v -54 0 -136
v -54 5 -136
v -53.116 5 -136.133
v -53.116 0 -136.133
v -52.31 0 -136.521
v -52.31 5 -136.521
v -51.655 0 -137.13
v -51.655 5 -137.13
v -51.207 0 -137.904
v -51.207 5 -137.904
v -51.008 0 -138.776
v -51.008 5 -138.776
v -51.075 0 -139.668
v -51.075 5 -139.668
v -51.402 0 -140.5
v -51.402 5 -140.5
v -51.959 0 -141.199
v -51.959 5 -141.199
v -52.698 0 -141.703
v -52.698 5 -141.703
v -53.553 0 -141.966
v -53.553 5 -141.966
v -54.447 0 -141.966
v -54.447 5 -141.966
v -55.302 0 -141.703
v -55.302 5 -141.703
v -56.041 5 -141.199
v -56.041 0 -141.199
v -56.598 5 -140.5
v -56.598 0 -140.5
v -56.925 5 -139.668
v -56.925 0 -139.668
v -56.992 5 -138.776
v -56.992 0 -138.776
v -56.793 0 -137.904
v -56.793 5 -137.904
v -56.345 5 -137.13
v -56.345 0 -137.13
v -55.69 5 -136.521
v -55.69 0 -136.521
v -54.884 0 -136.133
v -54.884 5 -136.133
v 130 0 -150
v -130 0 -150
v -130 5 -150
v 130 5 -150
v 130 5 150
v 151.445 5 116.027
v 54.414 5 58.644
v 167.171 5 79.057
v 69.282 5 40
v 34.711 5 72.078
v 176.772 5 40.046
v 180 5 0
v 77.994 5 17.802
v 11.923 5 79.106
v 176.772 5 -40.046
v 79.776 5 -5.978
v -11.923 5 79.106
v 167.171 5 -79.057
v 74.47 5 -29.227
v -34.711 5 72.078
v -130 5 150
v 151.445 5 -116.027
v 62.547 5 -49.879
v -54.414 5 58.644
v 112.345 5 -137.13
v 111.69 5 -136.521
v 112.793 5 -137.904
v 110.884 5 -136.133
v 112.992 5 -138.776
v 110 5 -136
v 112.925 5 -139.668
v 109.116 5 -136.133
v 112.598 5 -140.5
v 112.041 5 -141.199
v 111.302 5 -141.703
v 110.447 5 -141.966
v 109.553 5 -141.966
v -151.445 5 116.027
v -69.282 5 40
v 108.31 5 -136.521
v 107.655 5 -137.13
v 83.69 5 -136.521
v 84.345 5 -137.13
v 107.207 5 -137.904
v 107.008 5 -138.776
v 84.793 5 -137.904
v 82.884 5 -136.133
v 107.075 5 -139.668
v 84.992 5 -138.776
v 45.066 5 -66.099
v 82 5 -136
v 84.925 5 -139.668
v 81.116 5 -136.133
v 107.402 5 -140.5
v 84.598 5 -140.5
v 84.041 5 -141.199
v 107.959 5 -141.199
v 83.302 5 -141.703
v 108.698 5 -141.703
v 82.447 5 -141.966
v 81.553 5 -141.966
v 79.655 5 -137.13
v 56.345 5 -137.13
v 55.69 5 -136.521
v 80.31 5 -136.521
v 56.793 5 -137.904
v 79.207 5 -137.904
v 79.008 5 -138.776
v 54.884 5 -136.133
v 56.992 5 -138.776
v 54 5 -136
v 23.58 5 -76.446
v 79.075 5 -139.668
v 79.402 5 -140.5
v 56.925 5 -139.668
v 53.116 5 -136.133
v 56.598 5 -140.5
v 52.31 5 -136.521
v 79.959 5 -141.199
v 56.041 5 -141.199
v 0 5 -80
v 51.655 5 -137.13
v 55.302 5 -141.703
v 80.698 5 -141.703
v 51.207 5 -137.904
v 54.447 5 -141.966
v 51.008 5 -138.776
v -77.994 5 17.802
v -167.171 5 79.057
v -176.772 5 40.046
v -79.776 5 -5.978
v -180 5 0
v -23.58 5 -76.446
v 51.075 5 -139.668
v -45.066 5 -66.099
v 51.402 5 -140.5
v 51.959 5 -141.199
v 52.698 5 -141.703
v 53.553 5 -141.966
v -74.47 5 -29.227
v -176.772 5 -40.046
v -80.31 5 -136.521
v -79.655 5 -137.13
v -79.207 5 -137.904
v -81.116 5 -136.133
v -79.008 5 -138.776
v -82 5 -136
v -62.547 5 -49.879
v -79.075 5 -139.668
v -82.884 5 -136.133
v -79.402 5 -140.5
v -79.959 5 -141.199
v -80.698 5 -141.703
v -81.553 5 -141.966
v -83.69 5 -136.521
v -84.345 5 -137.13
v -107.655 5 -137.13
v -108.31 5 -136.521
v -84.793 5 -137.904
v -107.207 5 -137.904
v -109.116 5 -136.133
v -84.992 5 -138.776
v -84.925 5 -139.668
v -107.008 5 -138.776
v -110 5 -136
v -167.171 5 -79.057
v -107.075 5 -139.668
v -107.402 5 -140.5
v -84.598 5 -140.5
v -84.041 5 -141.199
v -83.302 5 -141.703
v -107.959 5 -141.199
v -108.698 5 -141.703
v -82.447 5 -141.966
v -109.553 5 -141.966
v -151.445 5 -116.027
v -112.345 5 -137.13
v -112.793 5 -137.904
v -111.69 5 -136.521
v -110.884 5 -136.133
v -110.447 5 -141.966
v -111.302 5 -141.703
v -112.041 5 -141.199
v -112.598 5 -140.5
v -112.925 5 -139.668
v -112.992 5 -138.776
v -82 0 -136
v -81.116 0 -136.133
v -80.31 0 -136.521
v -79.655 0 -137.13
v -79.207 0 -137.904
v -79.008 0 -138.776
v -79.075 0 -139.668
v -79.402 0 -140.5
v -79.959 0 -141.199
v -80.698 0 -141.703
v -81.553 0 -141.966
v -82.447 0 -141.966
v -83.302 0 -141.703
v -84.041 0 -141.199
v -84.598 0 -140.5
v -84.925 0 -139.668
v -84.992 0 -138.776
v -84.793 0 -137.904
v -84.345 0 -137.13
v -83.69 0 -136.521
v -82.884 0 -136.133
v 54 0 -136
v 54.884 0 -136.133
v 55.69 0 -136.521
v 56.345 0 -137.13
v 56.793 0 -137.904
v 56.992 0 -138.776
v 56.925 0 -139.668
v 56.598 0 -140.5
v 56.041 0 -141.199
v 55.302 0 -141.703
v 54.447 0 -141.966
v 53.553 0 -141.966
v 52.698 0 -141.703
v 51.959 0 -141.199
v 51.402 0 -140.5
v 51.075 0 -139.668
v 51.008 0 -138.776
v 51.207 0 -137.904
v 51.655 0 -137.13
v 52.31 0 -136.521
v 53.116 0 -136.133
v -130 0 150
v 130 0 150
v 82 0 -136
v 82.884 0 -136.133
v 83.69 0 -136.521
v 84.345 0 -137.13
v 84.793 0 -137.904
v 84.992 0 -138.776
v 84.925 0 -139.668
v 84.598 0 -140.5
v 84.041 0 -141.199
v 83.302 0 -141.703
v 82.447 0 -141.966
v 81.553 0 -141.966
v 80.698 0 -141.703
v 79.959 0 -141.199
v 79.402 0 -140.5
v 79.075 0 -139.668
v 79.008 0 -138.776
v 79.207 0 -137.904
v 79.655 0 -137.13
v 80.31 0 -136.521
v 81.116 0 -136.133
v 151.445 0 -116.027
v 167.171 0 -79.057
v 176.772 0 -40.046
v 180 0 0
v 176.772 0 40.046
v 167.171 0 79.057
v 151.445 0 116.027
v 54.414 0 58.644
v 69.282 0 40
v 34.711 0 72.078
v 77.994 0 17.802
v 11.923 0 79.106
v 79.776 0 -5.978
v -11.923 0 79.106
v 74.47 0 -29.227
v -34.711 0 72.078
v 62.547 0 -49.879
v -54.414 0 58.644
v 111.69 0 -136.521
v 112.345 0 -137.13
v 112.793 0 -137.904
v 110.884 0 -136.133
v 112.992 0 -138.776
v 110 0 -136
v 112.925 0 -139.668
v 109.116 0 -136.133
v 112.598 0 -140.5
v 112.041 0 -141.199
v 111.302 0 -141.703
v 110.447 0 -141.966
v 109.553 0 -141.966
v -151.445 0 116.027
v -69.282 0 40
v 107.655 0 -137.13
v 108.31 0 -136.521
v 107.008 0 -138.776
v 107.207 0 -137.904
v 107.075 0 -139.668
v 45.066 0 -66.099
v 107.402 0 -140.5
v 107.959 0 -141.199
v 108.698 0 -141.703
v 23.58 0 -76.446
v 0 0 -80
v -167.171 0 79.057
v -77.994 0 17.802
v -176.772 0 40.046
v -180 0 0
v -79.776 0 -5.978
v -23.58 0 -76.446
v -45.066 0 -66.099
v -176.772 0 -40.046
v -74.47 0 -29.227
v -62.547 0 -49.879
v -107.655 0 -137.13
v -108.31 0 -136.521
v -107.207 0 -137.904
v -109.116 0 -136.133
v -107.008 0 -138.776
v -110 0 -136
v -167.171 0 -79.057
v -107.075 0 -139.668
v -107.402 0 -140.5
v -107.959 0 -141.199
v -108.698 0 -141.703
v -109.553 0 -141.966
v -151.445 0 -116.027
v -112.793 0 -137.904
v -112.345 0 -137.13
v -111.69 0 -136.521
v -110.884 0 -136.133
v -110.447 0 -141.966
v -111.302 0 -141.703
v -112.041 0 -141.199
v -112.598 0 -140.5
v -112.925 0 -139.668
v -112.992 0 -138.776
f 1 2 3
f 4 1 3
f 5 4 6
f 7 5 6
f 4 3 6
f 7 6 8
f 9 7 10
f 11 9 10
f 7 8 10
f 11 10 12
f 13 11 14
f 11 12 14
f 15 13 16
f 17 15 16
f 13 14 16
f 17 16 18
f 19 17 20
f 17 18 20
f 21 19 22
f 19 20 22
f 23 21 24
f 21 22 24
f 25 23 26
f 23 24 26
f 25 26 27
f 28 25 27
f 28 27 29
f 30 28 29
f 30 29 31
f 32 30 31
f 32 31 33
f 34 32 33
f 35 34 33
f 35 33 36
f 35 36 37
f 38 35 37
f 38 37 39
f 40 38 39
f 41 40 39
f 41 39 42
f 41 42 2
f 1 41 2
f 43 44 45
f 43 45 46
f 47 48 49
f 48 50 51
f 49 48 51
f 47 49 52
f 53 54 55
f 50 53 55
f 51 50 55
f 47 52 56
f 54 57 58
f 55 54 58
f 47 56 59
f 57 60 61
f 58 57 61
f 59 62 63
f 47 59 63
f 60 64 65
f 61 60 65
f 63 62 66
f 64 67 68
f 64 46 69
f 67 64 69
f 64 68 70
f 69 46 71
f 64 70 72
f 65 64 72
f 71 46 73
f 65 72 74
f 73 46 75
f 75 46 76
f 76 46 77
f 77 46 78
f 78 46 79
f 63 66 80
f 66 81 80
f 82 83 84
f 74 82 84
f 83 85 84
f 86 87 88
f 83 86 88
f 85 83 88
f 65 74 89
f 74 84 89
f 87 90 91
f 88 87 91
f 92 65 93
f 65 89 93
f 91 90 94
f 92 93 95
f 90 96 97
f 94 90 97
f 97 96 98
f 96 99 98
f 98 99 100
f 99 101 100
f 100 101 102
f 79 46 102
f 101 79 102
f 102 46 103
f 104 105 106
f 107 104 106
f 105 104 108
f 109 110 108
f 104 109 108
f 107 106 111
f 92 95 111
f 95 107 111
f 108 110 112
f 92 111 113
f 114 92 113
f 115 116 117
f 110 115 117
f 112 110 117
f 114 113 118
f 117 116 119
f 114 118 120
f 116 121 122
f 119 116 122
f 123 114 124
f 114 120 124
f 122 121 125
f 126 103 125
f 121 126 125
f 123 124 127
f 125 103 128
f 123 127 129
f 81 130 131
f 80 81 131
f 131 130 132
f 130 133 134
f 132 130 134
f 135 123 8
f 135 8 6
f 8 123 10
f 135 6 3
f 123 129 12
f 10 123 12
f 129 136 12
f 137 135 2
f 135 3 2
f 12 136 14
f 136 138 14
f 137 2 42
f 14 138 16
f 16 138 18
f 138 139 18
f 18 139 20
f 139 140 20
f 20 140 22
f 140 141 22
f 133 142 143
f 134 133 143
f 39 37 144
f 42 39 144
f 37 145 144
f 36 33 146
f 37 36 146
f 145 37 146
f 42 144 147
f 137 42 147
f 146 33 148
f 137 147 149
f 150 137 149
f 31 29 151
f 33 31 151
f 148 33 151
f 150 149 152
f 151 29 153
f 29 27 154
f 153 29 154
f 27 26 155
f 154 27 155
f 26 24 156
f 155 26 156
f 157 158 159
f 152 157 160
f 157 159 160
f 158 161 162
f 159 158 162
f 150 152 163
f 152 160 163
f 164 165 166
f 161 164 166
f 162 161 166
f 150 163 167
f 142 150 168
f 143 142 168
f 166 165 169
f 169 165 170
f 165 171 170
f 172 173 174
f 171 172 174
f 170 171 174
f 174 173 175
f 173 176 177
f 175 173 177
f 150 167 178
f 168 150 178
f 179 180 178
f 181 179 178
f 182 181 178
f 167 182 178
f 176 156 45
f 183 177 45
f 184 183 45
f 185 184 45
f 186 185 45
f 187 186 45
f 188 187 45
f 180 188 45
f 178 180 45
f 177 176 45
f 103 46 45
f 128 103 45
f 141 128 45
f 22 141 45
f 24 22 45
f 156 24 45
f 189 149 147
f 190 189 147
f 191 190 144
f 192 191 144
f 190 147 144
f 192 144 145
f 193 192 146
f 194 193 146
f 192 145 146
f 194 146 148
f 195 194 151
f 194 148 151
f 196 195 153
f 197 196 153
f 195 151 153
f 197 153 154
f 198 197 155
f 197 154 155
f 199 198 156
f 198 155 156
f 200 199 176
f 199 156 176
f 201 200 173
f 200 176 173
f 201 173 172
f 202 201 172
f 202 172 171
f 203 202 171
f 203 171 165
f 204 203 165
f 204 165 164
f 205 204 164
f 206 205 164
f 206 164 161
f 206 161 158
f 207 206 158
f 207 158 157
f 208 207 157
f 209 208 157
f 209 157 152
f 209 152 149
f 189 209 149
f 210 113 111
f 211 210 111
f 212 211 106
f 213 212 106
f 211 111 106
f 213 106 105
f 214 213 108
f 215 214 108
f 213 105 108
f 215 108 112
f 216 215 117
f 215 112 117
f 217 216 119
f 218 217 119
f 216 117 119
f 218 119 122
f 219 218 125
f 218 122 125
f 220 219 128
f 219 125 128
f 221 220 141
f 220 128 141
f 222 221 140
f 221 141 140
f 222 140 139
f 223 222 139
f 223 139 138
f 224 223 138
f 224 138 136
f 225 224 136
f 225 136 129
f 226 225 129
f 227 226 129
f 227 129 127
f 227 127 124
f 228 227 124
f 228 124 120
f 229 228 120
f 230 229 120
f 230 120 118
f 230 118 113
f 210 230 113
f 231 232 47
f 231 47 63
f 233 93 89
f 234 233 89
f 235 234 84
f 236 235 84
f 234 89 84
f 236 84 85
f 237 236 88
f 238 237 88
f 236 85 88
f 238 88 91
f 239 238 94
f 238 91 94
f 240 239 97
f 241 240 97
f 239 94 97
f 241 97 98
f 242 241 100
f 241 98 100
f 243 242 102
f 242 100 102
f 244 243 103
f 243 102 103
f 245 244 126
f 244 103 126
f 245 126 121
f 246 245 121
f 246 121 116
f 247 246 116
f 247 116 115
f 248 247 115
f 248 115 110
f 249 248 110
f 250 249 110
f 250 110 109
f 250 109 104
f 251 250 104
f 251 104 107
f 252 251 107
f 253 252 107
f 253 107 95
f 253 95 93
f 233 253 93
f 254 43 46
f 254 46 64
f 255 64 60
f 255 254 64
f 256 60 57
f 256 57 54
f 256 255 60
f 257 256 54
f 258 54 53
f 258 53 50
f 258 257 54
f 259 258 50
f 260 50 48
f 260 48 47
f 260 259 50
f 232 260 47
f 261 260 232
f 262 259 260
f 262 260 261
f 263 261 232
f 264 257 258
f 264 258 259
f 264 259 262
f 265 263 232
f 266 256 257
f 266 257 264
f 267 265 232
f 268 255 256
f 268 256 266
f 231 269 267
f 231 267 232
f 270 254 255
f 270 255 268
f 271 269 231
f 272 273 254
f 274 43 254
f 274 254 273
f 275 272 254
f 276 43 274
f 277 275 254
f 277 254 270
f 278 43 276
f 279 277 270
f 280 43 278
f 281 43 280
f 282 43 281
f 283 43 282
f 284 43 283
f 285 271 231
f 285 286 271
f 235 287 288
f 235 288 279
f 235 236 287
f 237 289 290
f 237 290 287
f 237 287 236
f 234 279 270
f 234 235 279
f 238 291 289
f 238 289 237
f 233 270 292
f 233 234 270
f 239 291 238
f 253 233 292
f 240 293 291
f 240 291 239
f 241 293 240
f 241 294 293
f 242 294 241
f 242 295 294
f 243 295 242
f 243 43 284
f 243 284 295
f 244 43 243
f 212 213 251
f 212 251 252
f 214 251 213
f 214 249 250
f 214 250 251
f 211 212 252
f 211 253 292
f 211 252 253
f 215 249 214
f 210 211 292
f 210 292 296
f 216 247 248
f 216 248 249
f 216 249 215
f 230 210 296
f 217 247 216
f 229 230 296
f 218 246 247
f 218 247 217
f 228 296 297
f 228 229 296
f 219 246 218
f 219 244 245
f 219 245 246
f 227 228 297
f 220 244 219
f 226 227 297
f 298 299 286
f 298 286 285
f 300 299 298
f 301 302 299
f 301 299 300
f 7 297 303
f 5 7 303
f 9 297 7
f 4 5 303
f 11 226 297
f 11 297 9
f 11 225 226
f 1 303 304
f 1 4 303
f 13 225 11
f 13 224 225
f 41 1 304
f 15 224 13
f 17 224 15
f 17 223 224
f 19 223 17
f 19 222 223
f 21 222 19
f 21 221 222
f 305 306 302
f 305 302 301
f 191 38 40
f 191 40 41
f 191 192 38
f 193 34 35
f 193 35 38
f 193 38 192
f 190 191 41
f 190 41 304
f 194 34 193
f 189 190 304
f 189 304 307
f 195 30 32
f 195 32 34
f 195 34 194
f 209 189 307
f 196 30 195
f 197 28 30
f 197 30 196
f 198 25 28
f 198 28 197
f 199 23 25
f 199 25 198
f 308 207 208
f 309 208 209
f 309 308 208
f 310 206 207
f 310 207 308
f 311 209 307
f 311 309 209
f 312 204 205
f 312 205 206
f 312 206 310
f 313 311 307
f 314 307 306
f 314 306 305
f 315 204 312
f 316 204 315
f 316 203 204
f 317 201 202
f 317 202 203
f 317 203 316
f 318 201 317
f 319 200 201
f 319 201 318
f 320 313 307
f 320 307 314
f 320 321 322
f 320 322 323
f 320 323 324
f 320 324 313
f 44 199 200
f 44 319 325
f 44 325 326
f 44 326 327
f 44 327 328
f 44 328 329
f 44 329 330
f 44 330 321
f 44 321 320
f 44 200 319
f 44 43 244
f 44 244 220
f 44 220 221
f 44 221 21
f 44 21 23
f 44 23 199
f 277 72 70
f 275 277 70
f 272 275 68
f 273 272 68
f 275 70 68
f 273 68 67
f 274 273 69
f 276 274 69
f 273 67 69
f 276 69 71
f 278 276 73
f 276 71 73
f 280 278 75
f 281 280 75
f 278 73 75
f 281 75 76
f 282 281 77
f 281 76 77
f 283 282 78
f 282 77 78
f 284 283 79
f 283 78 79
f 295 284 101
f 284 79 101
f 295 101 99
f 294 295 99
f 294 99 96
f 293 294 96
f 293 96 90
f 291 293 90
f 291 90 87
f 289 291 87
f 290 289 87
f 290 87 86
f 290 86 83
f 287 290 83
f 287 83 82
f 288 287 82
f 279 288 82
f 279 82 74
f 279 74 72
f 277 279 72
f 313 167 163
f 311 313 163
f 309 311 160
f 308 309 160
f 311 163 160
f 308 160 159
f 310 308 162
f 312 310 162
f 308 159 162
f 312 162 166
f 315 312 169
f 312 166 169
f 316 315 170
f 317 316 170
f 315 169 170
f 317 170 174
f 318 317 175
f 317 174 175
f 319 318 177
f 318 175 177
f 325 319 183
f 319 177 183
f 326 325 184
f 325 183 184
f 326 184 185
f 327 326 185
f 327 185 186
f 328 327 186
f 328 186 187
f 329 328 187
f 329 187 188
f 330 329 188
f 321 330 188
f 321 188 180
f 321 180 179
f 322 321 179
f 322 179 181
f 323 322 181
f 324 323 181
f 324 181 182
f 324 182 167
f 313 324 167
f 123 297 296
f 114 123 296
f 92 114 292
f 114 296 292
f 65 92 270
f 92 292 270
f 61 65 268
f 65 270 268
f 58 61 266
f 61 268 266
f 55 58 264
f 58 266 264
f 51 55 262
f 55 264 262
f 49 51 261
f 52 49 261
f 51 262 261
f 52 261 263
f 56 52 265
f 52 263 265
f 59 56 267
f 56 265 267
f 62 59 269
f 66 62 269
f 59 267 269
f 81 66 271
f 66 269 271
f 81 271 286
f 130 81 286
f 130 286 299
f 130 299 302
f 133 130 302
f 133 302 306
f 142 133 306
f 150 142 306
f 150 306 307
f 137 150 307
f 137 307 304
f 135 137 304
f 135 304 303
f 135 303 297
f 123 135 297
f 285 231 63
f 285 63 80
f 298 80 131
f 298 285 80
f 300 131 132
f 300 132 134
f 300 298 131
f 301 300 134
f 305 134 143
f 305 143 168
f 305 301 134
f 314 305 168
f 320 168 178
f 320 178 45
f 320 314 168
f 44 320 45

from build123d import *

# Parameters (mm, degrees)
BOSS_EXTRUDE1_DEPTH = 5
SKETCH2_R           = 80
CUT_EXTRUDE5_DEPTH  = 10
SKETCH3_R           = 3
CUT_EXTRUDE6_DEPTH  = 235.360832905


with BuildPart() as part:
    # Lid case → Boss-Extrude1 (new body)
    with BuildSketch(Plane(origin=(0, 0, 0), x_dir=(1, 0, 0), z_dir=(0, 1, 0))):
        with BuildLine():
            Line((-130, 150), (130, 150))
            ThreePointArc((130, 150), (180, 0), (130, -150))
            Line((130, -150), (-130, -150))
            ThreePointArc((-130, -150), (-180, 0), (-130, 150))
        make_face()
    extrude(amount=BOSS_EXTRUDE1_DEPTH)

    # Sketch2 → Cut-Extrude5 (cut)
    with BuildSketch(Plane.XZ):
        Circle(SKETCH2_R)
    extrude(amount=-CUT_EXTRUDE5_DEPTH, mode=Mode.SUBTRACT)

    # Sketch3 → Cut-Extrude6 (cut, through all)
    with BuildSketch(Plane(origin=(0, 5, 0), x_dir=(1, 0, 0), z_dir=(0, 1, 0))):
        with Locations((-110, 139)):
            Circle(SKETCH3_R)
        with Locations((-82, 139)):
            Circle(SKETCH3_R)
        with Locations((-54, 139)):
            Circle(SKETCH3_R)
        with Locations((54, 139)):
            Circle(SKETCH3_R)
        with Locations((82, 139)):
            Circle(SKETCH3_R)
        with Locations((110, 139)):
            Circle(SKETCH3_R)
    extrude(amount=-CUT_EXTRUDE6_DEPTH, mode=Mode.SUBTRACT)


solid = part.part
